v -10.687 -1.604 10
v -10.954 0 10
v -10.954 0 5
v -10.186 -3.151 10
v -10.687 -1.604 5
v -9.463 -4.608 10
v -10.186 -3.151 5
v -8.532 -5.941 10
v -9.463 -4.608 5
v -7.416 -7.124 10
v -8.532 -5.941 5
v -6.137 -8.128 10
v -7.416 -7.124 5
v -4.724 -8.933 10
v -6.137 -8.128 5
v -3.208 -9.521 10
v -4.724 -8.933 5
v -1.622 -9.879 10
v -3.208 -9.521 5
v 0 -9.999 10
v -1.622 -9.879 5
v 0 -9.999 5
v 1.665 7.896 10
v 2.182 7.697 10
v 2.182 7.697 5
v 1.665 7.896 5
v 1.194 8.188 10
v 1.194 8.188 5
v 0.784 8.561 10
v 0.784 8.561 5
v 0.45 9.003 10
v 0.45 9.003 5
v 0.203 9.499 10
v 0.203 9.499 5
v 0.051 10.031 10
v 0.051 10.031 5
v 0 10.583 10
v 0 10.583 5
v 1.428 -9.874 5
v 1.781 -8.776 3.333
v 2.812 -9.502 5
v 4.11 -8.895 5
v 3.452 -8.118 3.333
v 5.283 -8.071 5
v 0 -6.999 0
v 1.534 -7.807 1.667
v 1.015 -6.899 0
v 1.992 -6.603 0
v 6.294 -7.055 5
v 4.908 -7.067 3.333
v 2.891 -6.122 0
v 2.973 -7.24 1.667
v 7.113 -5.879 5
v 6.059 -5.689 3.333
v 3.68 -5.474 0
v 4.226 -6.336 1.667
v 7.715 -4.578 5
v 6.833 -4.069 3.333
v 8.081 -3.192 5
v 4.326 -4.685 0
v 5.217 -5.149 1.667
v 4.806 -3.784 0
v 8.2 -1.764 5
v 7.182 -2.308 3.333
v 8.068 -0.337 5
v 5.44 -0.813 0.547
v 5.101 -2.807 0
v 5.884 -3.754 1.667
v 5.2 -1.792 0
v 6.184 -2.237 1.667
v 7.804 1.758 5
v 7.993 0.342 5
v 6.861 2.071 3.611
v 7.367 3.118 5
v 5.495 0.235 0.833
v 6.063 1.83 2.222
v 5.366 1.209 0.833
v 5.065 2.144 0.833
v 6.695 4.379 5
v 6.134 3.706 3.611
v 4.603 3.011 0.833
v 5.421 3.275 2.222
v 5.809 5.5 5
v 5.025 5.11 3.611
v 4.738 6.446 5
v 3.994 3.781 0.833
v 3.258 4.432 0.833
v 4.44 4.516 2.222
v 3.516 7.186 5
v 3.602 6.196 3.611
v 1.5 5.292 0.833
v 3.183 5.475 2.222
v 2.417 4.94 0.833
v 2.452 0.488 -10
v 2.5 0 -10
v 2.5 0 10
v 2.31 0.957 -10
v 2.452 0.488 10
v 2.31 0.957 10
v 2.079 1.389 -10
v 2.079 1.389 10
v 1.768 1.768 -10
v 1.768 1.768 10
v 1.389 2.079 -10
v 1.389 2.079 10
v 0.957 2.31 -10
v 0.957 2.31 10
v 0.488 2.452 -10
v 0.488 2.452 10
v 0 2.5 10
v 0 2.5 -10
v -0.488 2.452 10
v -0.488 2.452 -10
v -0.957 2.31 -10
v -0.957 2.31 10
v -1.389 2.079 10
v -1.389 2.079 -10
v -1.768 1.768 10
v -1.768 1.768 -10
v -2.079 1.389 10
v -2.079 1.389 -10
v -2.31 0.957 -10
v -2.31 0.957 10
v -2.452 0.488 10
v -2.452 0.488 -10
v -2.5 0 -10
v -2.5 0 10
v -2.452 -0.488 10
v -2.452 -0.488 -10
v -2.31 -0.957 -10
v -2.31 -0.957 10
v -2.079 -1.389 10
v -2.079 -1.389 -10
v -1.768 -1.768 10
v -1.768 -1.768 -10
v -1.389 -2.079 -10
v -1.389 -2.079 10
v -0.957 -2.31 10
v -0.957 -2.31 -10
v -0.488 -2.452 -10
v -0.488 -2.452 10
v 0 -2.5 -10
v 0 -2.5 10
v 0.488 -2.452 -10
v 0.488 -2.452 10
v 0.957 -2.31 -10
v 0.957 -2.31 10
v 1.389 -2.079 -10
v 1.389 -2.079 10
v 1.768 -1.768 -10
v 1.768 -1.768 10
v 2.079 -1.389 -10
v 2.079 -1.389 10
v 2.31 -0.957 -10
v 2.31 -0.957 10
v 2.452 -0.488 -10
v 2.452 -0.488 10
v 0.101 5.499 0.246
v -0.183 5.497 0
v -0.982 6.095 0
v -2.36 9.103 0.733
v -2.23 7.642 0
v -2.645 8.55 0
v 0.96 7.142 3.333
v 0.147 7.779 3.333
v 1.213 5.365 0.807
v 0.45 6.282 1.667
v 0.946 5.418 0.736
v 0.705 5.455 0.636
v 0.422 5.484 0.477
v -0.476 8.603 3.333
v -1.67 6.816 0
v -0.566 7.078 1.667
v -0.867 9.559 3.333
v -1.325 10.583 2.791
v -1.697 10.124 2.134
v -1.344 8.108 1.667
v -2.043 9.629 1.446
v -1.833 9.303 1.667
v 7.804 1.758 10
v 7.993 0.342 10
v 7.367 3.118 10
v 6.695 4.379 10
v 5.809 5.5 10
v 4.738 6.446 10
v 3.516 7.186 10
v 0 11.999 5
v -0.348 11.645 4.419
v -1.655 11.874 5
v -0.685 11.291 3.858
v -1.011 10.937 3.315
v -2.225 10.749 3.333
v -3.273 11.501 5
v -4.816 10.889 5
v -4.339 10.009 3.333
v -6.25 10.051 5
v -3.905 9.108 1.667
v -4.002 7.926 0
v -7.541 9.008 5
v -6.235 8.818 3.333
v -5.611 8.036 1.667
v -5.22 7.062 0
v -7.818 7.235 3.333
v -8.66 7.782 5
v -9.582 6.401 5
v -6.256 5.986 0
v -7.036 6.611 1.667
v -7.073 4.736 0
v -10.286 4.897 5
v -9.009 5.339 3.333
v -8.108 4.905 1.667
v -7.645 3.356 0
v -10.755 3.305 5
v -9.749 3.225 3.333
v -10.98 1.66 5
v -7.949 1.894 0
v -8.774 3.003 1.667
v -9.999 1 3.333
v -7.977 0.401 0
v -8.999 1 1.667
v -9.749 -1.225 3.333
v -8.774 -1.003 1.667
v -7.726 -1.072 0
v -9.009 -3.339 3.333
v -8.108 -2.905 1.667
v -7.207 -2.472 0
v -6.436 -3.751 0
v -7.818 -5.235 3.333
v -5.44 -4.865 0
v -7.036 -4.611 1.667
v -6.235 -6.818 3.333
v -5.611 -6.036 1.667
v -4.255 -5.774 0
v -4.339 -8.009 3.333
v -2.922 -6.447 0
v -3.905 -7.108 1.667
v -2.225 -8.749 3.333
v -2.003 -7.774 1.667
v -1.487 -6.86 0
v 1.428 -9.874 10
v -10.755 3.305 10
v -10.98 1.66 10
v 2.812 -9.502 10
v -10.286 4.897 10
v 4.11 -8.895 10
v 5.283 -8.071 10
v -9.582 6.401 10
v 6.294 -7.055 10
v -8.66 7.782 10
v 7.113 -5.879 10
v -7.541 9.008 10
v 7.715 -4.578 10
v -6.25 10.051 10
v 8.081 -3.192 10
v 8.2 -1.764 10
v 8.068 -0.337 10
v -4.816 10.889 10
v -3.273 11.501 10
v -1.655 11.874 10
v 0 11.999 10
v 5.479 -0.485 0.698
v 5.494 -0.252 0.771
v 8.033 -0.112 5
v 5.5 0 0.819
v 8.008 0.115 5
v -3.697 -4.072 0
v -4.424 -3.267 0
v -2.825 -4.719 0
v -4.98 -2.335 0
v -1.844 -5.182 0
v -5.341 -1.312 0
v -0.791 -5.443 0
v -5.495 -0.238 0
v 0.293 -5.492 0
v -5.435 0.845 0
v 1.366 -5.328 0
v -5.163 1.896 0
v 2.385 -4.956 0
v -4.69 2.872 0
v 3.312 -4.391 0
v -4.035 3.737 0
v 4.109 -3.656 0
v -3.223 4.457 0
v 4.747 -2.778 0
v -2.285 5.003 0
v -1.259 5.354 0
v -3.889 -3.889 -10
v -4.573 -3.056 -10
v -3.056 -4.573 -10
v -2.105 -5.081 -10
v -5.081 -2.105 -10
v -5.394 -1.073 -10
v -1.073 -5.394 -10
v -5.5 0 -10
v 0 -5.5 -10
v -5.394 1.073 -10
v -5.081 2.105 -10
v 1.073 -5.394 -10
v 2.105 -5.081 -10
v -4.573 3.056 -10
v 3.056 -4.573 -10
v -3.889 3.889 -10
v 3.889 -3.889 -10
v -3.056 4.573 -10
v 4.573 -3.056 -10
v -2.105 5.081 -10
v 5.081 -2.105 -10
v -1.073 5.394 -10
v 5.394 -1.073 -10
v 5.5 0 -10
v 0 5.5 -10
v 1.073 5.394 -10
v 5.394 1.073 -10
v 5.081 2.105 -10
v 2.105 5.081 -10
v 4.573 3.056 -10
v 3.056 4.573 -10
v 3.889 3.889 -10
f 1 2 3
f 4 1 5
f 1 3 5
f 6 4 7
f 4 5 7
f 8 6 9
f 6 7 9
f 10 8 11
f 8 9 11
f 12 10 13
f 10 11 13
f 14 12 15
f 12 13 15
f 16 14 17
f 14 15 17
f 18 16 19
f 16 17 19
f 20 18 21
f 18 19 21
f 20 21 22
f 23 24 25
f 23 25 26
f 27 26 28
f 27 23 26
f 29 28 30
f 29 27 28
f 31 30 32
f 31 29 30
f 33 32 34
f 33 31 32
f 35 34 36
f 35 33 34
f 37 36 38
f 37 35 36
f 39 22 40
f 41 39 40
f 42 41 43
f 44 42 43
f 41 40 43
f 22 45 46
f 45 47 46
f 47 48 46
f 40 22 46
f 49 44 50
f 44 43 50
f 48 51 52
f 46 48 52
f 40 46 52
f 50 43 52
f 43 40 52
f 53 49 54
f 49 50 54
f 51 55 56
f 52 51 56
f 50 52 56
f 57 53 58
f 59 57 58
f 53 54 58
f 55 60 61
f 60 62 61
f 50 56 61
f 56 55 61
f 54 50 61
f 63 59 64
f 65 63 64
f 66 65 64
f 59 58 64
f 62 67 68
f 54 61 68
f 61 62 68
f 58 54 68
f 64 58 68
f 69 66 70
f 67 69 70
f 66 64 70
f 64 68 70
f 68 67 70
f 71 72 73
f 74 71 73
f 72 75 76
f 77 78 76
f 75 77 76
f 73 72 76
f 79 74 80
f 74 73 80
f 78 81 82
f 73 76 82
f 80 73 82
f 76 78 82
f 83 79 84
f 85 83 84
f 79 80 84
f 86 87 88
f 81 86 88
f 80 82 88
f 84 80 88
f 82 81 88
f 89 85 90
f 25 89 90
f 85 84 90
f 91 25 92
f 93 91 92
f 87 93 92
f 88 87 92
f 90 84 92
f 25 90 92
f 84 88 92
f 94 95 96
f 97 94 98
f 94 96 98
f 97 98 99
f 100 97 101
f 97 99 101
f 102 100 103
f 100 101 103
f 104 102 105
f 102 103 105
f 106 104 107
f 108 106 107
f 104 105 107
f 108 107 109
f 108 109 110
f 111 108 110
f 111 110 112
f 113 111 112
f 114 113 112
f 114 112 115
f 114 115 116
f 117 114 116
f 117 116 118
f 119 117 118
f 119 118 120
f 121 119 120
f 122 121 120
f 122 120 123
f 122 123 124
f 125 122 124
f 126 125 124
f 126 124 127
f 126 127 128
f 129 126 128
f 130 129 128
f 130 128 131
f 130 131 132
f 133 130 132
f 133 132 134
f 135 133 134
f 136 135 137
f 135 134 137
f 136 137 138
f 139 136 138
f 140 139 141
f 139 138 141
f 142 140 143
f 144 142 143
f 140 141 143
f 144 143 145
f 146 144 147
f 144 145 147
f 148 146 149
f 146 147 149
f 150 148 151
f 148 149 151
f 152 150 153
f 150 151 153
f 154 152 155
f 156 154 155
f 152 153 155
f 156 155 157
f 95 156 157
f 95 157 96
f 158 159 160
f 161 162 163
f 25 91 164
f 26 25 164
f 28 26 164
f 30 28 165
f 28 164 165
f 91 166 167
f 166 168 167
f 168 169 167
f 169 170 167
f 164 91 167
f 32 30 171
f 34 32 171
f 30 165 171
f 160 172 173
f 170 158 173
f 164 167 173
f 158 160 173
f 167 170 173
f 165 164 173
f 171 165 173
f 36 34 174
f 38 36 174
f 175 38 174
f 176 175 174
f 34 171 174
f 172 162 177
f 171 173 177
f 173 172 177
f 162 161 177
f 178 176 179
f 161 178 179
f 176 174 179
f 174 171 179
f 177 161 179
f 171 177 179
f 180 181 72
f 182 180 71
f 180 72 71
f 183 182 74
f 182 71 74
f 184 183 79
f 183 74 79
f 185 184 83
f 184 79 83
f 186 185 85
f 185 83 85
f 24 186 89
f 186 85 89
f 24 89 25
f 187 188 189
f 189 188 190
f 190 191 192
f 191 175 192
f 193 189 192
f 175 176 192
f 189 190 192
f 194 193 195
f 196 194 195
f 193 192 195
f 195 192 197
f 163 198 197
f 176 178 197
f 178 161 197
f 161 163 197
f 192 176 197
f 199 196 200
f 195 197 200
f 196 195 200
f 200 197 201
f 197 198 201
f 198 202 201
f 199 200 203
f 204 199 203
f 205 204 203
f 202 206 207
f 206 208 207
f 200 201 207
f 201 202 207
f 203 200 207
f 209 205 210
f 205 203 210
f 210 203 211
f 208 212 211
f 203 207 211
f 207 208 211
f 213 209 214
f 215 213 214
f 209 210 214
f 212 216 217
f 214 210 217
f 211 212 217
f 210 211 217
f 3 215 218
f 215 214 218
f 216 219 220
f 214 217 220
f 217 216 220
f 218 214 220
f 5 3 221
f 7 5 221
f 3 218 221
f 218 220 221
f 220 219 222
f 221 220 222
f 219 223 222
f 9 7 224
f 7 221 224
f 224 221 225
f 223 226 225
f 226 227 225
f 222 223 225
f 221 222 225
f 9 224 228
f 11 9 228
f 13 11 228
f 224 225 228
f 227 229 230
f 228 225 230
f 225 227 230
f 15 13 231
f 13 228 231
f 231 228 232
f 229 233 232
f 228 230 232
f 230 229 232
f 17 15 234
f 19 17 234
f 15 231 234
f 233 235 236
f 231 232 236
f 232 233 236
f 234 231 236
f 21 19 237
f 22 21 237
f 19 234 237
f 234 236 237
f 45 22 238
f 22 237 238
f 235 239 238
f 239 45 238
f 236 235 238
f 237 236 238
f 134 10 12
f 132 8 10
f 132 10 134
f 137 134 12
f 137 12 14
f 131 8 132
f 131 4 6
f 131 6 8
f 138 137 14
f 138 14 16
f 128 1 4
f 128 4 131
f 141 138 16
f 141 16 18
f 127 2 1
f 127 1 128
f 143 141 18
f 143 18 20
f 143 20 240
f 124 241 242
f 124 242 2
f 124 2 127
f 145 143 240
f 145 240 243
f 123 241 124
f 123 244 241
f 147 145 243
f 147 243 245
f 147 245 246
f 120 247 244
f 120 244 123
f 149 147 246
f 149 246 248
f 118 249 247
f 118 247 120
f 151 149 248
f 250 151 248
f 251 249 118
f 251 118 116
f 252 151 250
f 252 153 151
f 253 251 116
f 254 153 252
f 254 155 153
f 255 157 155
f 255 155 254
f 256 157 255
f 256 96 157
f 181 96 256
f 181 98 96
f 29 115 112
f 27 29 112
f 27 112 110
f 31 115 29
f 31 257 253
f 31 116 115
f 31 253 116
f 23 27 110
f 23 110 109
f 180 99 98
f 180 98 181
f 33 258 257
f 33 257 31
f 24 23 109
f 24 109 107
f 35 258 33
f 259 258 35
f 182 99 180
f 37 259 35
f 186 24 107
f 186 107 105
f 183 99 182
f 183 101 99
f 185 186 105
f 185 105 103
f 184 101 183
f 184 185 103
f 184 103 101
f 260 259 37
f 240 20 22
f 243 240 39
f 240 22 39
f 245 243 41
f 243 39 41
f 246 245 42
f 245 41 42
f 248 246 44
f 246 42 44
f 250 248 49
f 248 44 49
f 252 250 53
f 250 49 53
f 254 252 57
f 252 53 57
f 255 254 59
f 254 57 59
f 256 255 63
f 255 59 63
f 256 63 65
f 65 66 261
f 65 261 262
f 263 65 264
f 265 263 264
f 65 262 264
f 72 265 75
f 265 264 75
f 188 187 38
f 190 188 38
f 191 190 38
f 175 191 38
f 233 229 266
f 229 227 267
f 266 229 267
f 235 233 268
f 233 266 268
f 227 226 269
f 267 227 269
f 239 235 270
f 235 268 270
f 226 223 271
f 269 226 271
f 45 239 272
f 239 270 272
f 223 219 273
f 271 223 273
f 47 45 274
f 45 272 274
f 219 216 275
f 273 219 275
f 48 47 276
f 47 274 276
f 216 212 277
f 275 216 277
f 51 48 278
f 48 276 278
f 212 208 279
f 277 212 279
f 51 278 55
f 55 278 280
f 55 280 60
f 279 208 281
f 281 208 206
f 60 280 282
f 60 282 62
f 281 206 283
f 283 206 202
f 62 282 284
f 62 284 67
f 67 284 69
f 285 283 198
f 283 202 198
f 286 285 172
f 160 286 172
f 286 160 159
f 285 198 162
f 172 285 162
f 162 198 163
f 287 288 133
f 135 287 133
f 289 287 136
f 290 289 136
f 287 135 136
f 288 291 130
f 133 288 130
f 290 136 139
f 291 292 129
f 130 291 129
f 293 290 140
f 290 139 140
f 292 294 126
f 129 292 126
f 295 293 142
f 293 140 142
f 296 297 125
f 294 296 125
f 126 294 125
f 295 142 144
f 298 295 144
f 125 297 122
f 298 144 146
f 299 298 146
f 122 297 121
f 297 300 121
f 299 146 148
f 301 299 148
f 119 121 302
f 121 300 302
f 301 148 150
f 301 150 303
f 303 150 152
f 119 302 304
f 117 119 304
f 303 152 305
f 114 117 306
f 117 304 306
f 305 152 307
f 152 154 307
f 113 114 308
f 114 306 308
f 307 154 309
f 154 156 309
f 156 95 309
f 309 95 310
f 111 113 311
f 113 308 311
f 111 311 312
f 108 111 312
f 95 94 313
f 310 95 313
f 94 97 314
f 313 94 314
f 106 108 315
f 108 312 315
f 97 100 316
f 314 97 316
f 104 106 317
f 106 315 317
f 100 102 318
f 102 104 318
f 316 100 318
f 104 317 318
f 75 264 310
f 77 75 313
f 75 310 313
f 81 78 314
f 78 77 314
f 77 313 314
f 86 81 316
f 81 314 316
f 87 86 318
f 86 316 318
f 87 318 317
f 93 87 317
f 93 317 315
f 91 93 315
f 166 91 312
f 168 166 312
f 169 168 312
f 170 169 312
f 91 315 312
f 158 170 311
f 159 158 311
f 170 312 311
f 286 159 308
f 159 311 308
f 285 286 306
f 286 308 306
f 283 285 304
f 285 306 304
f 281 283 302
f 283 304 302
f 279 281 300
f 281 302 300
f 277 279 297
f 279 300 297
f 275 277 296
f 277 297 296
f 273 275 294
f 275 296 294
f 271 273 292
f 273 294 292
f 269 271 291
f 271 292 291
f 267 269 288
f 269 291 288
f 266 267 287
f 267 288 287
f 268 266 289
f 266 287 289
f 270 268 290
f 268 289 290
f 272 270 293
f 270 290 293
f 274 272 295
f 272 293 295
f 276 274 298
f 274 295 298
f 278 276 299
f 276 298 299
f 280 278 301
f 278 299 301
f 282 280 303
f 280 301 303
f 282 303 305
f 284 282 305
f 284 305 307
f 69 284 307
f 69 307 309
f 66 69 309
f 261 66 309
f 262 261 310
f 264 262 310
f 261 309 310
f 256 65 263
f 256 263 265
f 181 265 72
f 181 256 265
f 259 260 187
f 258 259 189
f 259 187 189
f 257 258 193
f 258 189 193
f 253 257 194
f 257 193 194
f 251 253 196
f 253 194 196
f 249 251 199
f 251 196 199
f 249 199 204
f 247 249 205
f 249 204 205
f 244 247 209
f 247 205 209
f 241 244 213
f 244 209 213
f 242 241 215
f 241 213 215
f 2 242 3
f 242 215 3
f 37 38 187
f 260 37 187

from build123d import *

# Parameters (mm, degrees)
F1_DEPTH      = 10
F2_R          = 5
F3_R          = 3
F4_T1_DEPTH   = 14.3477235542
F4_T4_ANGLE   = 100.2769257202
F4_T6_ANGLE   = 247.4672415992
F4_T8_ANGLE   = 7.8282705893
F4_T10_ANGLE  = 71.7247245492
F4_T12_ANGLE  = 74.1733798681
F5_R          = 5.5
F6_DEPTH      = 10
F6_DEPTH_BACK = 5
F7_R          = 2.5
F8_DEPTH      = 20.0010001


# Not quite as in the source:
# - a fillet or chamfer that OpenCascade refuses, or shapes differently, is made with other operations: its cross-section is extruded or revolved along the edge and cut away or added


with BuildPart() as f1:
    # F0 (on Top) → F1 (new body)
    with BuildSketch(Plane.XY):
        with BuildLine():
            ThreePointArc((0, 11.9994233124), (-8.123630239, 8.4157902443), (-10.9538720645, 0))
            ThreePointArc((-10.9538720645, 0), (-7.4157902443, -7.123630239), (0, -9.9994233124))
            ThreePointArc((0, -9.9994233124), (6.4028990813, -6.9221417854), (8, 0))
            ThreePointArc((8, 0), (5.6568542495, 5.6568542495), (0, 8))
            Line((0, 8), (0, 11.9994233124))
        make_face()
    extrude(amount=F1_DEPTH)

    # F2
    f2_edges = [f1.edges().sort_by_distance(p)[0] for p in [
        (8, 0, 5),
    ]]
    fillet(f2_edges, radius=F2_R)

    # F3
    f3_edges = [f1.edges().sort_by_distance(p)[0] for p in [
        (0, 8, 5),
    ]]
    fillet(f3_edges, radius=F3_R)

    # F4: chamfer of 5 x 3 on 5 edges, made by hand

    # F4_s2 → F4_t1 (cut)
    with BuildSketch(Plane.XZ.offset(-24.9307287984)):
        Polygon((0, 5), (-3, 0), (0, 0), align=None)
    extrude(amount=F4_T1_DEPTH, mode=Mode.SUBTRACT)

    # F4_s3 → F4_t4 (revolve, cut)
    with BuildSketch(Plane.YZ):
        Polygon((-9.9994233124, 5), (-6.9994233124, 0), (-9.9994233124, 0), align=None)
    revolve(axis=Axis((0, -1.7995271056, 0), (0, 0, 1)), revolution_arc=F4_T4_ANGLE, mode=Mode.SUBTRACT)

    # F4_s5 → F4_t6 (revolve, cut)
    with BuildSketch(Plane(origin=(-0.353957442, 0.8531488769, 0), x_dir=(0, 0, 1), z_dir=(0.3832115905, -0.9236605853, 0))):
        Polygon((5, -11.3826349029), (0, -8.3826349029), (0, -11.3826349029), align=None)
    revolve(axis=Axis((0, 1, 0), (0, 0, 1)), revolution_arc=F4_T6_ANGLE, mode=Mode.SUBTRACT)

    # F4_s7 → F4_t8 (revolve, cut)
    with BuildSketch(Plane(origin=(0.315895823, -1.7422505282, 0), x_dir=(0, 0, 1), z_dir=(0.1784059699, -0.9839569655, 0))):
        Polygon((5, -7.8788498285), (0, -4.8788498282), (0, -7.8788498282), align=None)
    revolve(axis=Axis((12.9881297006, 0.5554131457, 0), (0, 0, -1)), revolution_arc=F4_T8_ANGLE, mode=Mode.SUBTRACT)

    # F4_s9 → F4_t10 (revolve, cut)
    with BuildSketch(Plane(origin=(0, 0, 0), x_dir=(0, 0, 1), z_dir=(0.0427240892, -0.9990869092, 0))):
        Polygon((5, -8), (0, -5), (0, -8), align=None)
    revolve(axis=Axis((0, 0, 0), (0, 0, 1)), revolution_arc=F4_T10_ANGLE, mode=Mode.SUBTRACT)

    # F4_s11 → F4_t12 (revolve, cut)
    with BuildSketch(Plane(origin=(0, 0, 0), x_dir=(0, 0, 1), z_dir=(0.9620913858, -0.2727272727, 0))):
        Polygon((5, -8), (0, -5), (0, -8), align=None)
    revolve(axis=Axis((3, 10.5830052443, 0), (0, 0, -1)), revolution_arc=F4_T12_ANGLE, mode=Mode.SUBTRACT)

    # F5 (on face) → F6 (join, two sides)
    with BuildSketch(Plane.XY) as f6_sk:
        Circle(F5_R)
    extrude(amount=-F6_DEPTH)
    extrude(f6_sk.sketch, amount=F6_DEPTH_BACK)

    # F7 (on face) → F8 (cut, through all)
    with BuildSketch(Plane.XY.offset(10)):
        Circle(F7_R)
    extrude(amount=-F8_DEPTH, mode=Mode.SUBTRACT)


solid = f1.part
